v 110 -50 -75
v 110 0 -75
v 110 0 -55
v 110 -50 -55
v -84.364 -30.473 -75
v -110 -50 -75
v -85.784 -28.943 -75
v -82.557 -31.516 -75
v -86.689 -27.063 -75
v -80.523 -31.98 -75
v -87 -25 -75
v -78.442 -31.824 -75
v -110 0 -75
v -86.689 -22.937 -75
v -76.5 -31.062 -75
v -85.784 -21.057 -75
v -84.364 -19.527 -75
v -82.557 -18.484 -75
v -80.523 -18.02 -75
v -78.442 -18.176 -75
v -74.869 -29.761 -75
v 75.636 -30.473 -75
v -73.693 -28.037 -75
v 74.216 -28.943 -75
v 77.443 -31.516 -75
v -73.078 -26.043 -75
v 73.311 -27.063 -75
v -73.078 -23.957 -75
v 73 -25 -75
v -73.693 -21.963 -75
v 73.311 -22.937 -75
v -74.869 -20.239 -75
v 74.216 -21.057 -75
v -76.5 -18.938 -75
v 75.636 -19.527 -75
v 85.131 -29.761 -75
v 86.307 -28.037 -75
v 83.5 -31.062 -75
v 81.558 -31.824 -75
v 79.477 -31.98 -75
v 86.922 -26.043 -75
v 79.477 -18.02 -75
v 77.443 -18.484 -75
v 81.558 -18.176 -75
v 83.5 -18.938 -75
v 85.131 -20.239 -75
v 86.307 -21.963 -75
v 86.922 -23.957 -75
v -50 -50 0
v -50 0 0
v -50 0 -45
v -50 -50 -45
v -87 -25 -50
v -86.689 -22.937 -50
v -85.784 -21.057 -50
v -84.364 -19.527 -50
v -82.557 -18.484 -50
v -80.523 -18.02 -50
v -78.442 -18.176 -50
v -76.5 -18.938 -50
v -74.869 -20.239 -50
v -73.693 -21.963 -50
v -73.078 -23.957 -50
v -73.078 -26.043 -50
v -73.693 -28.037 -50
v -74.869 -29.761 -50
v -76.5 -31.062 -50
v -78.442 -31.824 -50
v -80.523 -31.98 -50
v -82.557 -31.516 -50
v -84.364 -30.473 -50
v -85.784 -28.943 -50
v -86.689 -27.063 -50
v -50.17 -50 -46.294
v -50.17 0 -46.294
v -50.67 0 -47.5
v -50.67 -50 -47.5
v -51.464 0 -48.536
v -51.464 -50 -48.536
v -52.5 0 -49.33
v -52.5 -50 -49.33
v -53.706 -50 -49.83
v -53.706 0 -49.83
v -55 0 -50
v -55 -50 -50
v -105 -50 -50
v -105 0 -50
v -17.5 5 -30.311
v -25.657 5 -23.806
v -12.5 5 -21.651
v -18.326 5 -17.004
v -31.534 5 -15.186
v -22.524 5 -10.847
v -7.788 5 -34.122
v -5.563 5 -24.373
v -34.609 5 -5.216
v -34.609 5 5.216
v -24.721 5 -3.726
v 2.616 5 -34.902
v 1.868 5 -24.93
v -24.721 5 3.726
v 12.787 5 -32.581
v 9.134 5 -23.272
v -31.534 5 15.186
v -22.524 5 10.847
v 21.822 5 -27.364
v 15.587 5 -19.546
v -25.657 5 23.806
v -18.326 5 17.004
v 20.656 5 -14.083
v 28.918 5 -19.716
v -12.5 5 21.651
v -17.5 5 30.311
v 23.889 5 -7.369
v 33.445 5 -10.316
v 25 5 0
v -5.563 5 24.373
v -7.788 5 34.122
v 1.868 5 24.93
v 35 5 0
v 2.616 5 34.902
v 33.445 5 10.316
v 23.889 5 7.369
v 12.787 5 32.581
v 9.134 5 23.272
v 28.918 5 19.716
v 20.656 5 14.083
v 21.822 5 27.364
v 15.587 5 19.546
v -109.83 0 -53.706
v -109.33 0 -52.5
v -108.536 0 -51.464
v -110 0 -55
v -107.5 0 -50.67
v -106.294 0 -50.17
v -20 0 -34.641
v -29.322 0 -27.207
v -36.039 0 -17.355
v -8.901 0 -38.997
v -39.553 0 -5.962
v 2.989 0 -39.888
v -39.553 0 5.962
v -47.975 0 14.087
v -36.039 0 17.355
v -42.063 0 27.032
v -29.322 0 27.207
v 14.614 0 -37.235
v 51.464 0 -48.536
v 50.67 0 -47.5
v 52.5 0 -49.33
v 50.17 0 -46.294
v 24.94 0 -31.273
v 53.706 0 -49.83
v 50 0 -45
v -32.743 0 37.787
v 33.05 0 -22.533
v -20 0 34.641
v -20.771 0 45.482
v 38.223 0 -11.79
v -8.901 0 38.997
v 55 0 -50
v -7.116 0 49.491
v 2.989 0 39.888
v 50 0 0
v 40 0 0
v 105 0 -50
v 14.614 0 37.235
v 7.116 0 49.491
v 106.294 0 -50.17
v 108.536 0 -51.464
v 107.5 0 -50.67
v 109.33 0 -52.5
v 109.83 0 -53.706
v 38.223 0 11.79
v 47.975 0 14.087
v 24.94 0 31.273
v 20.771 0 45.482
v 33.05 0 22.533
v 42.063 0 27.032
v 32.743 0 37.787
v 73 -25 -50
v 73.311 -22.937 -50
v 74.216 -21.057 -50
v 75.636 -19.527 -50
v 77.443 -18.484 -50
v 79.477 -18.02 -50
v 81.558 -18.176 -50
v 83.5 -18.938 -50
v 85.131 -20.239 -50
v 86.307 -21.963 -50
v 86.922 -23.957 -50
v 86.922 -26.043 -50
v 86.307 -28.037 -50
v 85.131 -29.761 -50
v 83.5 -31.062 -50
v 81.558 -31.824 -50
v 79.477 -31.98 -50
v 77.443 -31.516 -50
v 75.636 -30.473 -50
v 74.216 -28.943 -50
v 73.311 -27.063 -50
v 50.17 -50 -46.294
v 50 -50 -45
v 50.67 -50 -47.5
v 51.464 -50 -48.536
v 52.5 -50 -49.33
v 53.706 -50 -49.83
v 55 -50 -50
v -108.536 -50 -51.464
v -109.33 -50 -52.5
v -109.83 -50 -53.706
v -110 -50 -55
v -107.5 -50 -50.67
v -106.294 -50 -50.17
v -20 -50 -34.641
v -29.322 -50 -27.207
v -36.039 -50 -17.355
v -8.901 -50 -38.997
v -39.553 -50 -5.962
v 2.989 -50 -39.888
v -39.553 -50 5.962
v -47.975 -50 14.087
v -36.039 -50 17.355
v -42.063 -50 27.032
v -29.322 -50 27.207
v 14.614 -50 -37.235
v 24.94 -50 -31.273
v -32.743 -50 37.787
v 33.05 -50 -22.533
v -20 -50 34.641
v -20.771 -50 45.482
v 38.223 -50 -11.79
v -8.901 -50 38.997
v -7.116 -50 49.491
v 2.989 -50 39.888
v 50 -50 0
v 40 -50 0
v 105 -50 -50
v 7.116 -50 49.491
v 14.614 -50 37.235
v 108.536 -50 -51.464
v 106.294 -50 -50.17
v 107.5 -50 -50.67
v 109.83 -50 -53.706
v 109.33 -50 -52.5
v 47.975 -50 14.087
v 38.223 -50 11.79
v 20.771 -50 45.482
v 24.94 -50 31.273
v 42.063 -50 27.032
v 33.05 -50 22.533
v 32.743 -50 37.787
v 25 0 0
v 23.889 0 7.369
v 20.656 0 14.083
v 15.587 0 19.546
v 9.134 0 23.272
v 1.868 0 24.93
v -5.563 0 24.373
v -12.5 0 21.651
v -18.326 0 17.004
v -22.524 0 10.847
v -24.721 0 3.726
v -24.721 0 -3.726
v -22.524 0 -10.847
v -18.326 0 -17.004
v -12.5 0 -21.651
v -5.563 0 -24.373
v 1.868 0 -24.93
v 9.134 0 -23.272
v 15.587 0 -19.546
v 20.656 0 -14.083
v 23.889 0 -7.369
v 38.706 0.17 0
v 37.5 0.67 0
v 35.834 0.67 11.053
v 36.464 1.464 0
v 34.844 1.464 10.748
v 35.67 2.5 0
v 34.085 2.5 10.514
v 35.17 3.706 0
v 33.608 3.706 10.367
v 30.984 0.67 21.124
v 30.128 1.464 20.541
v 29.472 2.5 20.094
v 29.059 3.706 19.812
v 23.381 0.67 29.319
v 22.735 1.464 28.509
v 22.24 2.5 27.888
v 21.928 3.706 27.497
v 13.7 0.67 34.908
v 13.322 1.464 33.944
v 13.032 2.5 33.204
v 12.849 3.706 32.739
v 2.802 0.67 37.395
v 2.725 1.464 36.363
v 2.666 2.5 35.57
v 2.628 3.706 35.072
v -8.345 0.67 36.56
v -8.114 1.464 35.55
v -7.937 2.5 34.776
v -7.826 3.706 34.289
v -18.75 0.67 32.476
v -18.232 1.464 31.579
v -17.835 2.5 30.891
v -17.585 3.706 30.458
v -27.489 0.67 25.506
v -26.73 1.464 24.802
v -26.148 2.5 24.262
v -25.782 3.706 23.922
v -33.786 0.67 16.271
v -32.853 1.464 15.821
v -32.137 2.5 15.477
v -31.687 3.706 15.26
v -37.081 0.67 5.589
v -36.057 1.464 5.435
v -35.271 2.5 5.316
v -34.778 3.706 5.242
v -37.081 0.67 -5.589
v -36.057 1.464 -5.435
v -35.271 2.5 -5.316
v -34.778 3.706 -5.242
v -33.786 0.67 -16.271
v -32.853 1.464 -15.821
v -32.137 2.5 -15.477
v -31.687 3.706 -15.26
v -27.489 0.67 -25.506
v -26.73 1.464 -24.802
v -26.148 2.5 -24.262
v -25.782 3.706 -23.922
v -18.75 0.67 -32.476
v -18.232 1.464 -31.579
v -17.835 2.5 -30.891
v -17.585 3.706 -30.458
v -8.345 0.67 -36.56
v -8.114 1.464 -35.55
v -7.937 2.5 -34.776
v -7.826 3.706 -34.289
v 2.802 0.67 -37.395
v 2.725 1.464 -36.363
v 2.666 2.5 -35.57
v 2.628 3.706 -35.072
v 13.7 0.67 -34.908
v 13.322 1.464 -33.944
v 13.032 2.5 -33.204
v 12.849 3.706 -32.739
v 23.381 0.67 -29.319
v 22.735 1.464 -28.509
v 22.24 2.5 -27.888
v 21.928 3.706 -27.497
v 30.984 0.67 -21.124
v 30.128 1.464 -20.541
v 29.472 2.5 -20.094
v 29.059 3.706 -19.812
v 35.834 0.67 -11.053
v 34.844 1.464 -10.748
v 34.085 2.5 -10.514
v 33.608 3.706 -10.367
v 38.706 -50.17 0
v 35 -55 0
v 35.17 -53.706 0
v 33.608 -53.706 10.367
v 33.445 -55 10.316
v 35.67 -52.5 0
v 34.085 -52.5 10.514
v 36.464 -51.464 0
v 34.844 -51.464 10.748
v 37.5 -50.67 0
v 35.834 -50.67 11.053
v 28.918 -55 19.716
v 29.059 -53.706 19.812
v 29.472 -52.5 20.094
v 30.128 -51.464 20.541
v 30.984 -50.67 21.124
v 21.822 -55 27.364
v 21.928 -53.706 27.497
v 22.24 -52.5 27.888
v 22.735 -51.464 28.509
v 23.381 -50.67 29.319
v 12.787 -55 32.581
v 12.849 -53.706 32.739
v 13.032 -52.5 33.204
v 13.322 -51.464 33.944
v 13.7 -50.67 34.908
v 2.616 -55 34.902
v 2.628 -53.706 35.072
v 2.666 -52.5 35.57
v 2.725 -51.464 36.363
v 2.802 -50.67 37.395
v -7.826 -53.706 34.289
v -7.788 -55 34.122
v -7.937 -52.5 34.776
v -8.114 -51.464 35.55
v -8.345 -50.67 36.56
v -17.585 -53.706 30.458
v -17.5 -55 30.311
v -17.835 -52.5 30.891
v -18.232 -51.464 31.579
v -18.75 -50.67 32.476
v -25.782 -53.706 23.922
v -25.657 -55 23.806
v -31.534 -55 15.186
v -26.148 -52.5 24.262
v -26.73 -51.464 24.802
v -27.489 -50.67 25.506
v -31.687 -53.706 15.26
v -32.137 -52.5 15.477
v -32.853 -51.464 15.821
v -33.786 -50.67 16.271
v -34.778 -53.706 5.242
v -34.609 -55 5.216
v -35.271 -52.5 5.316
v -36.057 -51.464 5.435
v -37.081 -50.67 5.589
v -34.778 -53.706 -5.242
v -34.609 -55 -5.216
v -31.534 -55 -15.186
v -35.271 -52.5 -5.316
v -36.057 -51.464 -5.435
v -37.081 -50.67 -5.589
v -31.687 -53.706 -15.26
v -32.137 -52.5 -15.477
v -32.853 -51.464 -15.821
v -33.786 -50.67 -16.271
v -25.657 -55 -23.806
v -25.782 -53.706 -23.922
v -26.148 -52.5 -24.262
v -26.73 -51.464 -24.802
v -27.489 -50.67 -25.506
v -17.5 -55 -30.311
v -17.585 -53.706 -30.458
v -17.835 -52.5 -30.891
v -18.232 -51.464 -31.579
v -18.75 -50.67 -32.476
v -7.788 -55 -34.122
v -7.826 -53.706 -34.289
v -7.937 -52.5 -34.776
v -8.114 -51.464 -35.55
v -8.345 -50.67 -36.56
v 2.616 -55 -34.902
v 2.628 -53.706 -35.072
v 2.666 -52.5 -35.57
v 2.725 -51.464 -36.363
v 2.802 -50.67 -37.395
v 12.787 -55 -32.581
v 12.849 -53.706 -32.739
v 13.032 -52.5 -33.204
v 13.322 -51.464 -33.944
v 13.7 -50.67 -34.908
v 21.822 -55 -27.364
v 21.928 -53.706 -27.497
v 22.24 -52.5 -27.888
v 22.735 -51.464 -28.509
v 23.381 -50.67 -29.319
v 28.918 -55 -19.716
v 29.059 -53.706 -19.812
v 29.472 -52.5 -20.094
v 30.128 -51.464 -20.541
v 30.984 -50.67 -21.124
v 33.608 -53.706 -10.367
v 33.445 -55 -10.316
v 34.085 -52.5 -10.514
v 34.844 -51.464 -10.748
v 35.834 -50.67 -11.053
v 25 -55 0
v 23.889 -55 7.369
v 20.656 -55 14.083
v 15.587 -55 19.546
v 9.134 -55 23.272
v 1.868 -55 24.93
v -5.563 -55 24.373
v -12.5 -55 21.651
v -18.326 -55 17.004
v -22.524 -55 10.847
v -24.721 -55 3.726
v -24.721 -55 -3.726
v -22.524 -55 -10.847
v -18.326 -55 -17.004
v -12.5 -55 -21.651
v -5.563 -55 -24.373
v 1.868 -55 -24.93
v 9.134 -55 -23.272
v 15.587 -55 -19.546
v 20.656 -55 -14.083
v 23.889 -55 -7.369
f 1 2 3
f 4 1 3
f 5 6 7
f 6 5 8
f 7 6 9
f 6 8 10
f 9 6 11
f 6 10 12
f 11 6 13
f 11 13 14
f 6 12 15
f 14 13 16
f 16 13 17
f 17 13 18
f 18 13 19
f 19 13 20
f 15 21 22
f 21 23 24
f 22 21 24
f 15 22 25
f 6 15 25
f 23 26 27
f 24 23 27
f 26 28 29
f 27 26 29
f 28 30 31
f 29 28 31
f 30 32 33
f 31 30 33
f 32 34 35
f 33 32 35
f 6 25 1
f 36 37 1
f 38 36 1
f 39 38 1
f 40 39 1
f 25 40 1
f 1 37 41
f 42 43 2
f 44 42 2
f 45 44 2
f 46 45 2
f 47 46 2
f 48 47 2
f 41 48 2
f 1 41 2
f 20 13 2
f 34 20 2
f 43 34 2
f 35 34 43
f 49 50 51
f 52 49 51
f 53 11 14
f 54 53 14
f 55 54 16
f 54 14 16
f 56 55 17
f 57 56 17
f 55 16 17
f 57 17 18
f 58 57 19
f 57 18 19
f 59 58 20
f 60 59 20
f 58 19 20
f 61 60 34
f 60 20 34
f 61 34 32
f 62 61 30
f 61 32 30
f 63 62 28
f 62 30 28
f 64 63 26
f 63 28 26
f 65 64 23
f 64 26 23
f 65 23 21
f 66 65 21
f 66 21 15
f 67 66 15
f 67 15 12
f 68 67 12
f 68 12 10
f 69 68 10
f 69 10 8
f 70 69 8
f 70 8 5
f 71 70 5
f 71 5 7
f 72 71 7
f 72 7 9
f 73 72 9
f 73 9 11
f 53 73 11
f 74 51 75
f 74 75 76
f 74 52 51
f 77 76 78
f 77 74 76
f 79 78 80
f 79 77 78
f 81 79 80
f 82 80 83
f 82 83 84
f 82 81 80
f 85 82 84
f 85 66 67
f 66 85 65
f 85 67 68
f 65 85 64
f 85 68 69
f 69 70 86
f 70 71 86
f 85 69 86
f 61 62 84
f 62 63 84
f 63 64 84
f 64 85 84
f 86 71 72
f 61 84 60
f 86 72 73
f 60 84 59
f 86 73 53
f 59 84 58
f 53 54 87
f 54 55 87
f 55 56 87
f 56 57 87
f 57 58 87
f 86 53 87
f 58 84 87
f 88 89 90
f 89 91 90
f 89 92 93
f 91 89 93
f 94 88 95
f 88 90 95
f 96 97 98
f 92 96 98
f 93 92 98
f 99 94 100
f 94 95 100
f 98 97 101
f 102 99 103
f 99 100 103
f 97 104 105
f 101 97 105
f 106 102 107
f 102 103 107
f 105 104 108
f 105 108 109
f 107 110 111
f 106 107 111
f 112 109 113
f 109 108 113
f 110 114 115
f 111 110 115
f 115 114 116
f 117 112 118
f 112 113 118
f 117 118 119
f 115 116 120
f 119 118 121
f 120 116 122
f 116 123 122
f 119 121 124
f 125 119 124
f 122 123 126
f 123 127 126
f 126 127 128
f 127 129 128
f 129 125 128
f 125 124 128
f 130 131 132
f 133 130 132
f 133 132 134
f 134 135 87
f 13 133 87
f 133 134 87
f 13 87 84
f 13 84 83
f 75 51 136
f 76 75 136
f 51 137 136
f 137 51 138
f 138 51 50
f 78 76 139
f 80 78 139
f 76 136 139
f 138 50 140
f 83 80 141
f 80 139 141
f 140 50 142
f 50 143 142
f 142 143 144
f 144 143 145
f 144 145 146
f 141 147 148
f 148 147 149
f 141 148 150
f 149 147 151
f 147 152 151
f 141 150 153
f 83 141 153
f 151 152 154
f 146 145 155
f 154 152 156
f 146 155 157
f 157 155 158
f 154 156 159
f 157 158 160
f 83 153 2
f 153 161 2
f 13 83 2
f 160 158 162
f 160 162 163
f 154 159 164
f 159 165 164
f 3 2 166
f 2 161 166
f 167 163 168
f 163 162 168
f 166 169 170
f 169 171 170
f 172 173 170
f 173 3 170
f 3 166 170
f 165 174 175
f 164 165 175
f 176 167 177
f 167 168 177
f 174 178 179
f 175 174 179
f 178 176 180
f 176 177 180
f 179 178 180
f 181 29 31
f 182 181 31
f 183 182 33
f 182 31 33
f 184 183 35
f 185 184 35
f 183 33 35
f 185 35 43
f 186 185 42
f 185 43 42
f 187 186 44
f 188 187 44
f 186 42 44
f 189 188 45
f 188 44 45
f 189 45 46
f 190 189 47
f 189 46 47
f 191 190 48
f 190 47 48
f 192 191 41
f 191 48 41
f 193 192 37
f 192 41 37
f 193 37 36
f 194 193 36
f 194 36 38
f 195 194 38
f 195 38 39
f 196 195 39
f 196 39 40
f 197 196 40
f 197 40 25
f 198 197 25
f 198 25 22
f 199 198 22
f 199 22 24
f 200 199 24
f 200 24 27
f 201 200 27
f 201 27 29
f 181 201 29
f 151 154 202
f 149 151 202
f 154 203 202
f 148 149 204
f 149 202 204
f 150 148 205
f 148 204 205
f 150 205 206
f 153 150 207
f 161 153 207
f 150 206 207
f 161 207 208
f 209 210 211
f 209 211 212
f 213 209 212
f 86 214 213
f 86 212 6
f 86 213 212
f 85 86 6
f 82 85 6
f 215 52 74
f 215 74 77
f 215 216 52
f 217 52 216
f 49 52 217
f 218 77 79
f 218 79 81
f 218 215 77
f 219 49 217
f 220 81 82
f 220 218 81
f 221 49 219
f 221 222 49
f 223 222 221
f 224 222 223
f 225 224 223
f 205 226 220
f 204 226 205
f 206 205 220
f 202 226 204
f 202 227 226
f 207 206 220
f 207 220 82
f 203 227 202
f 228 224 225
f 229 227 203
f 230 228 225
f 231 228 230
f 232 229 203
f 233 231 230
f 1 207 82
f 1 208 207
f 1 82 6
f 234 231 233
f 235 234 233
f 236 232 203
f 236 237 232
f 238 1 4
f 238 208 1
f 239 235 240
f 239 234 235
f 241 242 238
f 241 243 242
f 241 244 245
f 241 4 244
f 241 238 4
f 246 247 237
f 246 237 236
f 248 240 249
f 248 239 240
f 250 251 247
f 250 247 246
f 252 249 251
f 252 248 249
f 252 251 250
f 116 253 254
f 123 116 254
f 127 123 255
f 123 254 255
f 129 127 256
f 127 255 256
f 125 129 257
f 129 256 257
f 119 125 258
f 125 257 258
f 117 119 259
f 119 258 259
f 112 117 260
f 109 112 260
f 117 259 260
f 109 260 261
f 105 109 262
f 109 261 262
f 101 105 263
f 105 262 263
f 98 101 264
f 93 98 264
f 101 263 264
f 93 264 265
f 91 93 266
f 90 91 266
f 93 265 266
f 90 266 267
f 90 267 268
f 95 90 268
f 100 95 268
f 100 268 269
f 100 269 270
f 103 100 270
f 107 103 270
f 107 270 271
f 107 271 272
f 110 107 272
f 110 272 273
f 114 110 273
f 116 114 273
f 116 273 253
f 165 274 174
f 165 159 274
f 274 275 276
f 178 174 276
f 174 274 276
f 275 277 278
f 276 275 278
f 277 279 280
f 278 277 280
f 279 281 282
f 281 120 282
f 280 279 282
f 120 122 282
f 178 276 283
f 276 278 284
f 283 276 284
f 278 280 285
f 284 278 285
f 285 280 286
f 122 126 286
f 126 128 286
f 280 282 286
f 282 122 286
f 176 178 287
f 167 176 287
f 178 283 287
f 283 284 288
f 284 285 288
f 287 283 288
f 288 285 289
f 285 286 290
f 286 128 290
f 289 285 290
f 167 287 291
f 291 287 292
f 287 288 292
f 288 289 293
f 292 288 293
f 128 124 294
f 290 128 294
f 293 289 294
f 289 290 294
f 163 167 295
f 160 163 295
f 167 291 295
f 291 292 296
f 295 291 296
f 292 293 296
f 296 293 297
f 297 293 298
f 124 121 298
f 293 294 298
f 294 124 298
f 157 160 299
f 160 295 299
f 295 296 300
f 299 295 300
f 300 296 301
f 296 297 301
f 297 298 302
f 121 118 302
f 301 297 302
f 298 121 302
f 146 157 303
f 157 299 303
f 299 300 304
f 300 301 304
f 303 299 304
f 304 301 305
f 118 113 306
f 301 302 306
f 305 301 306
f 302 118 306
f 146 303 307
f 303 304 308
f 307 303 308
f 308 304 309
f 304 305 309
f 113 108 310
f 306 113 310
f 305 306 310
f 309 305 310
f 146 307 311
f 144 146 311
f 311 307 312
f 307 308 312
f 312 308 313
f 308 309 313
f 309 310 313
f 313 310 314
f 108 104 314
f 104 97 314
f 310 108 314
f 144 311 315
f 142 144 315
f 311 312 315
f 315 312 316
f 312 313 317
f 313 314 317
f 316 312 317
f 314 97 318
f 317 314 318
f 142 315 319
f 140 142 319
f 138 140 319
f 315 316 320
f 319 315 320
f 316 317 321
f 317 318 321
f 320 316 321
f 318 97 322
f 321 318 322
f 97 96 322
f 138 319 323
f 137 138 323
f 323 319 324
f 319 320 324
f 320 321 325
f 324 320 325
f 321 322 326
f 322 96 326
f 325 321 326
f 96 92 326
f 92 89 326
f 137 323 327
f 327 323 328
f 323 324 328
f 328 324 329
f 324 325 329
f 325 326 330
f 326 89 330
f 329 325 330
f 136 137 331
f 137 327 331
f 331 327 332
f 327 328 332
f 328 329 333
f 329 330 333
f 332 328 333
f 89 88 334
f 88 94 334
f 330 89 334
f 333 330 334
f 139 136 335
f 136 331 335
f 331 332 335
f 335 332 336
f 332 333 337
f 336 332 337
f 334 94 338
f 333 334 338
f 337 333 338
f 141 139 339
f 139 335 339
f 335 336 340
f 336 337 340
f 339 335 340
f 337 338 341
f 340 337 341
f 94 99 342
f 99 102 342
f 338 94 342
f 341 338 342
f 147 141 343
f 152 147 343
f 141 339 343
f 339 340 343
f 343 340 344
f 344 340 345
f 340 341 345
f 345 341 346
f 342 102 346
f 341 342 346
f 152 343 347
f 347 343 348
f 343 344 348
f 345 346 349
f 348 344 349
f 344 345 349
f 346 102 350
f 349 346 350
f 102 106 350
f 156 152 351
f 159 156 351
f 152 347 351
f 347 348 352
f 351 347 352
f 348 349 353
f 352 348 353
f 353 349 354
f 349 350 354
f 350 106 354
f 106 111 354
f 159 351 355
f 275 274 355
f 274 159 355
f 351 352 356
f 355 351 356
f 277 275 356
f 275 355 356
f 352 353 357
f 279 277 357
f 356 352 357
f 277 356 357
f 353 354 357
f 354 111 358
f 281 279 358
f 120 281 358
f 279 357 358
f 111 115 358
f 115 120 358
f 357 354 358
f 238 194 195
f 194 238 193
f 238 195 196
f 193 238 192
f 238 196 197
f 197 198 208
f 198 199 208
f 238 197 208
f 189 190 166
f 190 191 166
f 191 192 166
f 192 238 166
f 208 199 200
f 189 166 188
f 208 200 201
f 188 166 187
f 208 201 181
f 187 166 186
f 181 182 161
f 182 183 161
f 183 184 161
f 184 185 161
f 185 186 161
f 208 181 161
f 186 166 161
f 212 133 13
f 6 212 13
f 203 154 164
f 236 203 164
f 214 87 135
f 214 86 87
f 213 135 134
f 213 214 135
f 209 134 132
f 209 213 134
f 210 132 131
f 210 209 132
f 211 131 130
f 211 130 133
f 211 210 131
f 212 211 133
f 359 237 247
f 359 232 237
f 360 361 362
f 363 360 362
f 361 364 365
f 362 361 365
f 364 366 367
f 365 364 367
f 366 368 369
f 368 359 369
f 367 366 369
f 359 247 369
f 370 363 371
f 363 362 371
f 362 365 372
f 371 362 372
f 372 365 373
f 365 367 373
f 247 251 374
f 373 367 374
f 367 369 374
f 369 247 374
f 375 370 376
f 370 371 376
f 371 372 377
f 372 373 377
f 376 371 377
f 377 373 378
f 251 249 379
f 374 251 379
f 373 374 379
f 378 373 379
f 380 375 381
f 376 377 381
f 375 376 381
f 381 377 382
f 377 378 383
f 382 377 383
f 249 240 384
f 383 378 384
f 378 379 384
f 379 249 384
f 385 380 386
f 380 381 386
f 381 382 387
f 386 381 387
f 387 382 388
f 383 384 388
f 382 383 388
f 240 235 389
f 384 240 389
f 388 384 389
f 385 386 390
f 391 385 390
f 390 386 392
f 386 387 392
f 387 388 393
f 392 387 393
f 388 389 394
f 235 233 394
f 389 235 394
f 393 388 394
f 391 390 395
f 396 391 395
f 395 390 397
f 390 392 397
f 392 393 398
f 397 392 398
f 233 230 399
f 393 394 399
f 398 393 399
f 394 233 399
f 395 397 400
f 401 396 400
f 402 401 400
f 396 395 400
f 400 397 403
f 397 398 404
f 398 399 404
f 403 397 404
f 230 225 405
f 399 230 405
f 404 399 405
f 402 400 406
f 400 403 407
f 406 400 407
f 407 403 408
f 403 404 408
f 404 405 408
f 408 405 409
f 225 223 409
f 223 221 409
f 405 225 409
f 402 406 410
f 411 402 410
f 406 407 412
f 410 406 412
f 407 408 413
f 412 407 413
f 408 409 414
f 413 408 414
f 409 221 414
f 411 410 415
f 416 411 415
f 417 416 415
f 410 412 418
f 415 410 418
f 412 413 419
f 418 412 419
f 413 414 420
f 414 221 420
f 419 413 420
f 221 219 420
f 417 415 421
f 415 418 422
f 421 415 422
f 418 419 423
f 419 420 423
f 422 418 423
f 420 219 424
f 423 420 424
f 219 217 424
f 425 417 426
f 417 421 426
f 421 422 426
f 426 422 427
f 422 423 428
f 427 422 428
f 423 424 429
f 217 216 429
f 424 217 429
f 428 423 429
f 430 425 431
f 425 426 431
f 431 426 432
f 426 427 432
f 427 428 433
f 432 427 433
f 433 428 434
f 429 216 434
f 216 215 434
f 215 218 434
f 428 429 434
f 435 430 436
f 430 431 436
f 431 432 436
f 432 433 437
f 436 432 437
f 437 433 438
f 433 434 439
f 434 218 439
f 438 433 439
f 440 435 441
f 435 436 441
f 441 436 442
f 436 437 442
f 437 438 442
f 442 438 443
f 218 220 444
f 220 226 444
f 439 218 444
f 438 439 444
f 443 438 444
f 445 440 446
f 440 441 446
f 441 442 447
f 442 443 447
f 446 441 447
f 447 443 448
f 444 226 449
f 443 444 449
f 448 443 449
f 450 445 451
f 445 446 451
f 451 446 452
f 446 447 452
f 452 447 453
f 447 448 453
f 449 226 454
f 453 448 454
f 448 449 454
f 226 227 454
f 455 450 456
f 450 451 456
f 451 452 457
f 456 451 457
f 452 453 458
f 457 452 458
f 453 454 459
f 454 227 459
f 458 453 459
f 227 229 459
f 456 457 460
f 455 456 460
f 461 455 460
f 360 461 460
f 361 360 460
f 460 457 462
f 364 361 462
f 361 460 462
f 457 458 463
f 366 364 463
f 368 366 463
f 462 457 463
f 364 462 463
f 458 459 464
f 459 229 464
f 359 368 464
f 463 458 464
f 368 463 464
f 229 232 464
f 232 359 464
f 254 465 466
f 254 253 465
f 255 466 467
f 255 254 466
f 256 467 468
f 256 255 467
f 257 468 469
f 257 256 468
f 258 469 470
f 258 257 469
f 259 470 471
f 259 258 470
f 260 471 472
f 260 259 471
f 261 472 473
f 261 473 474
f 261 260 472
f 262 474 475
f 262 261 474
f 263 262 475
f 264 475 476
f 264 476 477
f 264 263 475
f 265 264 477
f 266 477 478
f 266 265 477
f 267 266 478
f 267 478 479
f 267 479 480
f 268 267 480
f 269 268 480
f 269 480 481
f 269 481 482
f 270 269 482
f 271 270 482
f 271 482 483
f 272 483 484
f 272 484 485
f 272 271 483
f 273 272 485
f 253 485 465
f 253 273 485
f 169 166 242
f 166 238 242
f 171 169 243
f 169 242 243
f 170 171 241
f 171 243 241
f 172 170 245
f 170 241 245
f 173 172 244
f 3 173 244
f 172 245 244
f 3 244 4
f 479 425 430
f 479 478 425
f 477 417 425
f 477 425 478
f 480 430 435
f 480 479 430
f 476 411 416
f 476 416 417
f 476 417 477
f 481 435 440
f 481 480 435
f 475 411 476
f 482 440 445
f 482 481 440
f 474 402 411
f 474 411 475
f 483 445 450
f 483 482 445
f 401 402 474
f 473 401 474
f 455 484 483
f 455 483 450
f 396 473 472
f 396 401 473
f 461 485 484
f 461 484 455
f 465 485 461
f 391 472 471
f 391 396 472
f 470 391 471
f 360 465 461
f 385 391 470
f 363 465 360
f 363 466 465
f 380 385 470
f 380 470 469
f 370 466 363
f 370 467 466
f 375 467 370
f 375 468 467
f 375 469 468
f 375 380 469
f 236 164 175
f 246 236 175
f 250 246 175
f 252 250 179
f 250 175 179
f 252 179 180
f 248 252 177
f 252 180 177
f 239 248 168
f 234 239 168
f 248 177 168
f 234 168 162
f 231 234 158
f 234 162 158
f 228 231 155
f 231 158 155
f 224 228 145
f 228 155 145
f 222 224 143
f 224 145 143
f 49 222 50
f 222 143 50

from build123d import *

# Parameters (mm, degrees)
F0_R       = 32.5
F0_R_2     = 25
F1_DEPTH   = 50
F4_D       = 14
F4_ON_F3_D = 14
F5_R       = 5
F6_R       = 35
F6_R_2     = 25
F7_DEPTH   = 50
F8_R       = 35
F8_R_2     = 25
F9_DEPTH   = 5
F10_DEPTH  = 60
F11_R      = 4.99999


# Not quite as in the source:
# - a fillet or chamfer is up to 0.001 mm smaller than in the source, because OpenCascade refuses the exact size


with BuildPart() as f1:
    # F0 (on Front) → F1 (new body)
    with BuildSketch(Plane.XZ):
        with BuildLine():
            ThreePointArc((-50, 0), (0, -50), (50, 0))
            ThreePointArc((50, 0), (0, 50), (-50, 0))
        make_face()
        Circle(F0_R, mode=Mode.SUBTRACT)
        with BuildLine():
            Line((50, -50), (50, 0))
            ThreePointArc((50, 0), (0, -50), (-50, 0))
            Line((-50, 0), (-50, -50))
            Line((-50, -50), (-110, -50))
            Line((-110, -50), (-110, -75))
            Line((-110, -75), (110, -75))
            Line((110, -75), (110, -50))
            Line((110, -50), (50, -50))
        make_face()
        Circle(F0_R)
        Circle(F0_R_2, mode=Mode.SUBTRACT)
    extrude(amount=F1_DEPTH)

    # F4 (through all)
    with Locations(Plane.XY.offset(-50)):
        with Locations((-80, -25)):
            Hole(F4_D / 2)

    # F4 on F3 (through all)
    with Locations(Plane.XY.offset(-50)):
        with Locations((80, -25)):
            Hole(F4_ON_F3_D / 2)

    # F5
    f5_edges = [f1.edges().sort_by_distance(p)[0] for p in [
        (50, -25, -50),
        (-50, -25, -50),
        (110, -25, -50),
        (-110, -25, -50),
    ]]
    fillet(f5_edges, radius=F5_R)

    # F6 (on face) → F7 (join)
    with BuildSketch(Plane(origin=(0, 0, 0), x_dir=(-1, 0, 0), z_dir=(0, 1, 0))):
        Circle(F6_R)
        Circle(F6_R_2, mode=Mode.SUBTRACT)
    extrude(amount=-F7_DEPTH)

    # F8 (on face) → F9 (join)
    with BuildSketch(Plane.XZ.offset(50)):
        Circle(F8_R)
        Circle(F8_R_2, mode=Mode.SUBTRACT)
    extrude(amount=F9_DEPTH)

    # F10 (add): a face of the model
    f10_faces = [f1.faces().sort_by_distance(p)[0] for p in [
        (-34.0100505063, -55, 0),
    ]]
    extrude(f10_faces, amount=-F10_DEPTH)

    # F11 (radius 5 in the source; OpenCascade refuses exactly that, so slightly less here)
    f11_edges = [f1.edges().sort_by_distance(p)[0] for p in [
        (-35, -50, 0),
        (-35, 0, 0),
    ]]
    fillet(f11_edges, radius=F11_R)


solid = f1.part
